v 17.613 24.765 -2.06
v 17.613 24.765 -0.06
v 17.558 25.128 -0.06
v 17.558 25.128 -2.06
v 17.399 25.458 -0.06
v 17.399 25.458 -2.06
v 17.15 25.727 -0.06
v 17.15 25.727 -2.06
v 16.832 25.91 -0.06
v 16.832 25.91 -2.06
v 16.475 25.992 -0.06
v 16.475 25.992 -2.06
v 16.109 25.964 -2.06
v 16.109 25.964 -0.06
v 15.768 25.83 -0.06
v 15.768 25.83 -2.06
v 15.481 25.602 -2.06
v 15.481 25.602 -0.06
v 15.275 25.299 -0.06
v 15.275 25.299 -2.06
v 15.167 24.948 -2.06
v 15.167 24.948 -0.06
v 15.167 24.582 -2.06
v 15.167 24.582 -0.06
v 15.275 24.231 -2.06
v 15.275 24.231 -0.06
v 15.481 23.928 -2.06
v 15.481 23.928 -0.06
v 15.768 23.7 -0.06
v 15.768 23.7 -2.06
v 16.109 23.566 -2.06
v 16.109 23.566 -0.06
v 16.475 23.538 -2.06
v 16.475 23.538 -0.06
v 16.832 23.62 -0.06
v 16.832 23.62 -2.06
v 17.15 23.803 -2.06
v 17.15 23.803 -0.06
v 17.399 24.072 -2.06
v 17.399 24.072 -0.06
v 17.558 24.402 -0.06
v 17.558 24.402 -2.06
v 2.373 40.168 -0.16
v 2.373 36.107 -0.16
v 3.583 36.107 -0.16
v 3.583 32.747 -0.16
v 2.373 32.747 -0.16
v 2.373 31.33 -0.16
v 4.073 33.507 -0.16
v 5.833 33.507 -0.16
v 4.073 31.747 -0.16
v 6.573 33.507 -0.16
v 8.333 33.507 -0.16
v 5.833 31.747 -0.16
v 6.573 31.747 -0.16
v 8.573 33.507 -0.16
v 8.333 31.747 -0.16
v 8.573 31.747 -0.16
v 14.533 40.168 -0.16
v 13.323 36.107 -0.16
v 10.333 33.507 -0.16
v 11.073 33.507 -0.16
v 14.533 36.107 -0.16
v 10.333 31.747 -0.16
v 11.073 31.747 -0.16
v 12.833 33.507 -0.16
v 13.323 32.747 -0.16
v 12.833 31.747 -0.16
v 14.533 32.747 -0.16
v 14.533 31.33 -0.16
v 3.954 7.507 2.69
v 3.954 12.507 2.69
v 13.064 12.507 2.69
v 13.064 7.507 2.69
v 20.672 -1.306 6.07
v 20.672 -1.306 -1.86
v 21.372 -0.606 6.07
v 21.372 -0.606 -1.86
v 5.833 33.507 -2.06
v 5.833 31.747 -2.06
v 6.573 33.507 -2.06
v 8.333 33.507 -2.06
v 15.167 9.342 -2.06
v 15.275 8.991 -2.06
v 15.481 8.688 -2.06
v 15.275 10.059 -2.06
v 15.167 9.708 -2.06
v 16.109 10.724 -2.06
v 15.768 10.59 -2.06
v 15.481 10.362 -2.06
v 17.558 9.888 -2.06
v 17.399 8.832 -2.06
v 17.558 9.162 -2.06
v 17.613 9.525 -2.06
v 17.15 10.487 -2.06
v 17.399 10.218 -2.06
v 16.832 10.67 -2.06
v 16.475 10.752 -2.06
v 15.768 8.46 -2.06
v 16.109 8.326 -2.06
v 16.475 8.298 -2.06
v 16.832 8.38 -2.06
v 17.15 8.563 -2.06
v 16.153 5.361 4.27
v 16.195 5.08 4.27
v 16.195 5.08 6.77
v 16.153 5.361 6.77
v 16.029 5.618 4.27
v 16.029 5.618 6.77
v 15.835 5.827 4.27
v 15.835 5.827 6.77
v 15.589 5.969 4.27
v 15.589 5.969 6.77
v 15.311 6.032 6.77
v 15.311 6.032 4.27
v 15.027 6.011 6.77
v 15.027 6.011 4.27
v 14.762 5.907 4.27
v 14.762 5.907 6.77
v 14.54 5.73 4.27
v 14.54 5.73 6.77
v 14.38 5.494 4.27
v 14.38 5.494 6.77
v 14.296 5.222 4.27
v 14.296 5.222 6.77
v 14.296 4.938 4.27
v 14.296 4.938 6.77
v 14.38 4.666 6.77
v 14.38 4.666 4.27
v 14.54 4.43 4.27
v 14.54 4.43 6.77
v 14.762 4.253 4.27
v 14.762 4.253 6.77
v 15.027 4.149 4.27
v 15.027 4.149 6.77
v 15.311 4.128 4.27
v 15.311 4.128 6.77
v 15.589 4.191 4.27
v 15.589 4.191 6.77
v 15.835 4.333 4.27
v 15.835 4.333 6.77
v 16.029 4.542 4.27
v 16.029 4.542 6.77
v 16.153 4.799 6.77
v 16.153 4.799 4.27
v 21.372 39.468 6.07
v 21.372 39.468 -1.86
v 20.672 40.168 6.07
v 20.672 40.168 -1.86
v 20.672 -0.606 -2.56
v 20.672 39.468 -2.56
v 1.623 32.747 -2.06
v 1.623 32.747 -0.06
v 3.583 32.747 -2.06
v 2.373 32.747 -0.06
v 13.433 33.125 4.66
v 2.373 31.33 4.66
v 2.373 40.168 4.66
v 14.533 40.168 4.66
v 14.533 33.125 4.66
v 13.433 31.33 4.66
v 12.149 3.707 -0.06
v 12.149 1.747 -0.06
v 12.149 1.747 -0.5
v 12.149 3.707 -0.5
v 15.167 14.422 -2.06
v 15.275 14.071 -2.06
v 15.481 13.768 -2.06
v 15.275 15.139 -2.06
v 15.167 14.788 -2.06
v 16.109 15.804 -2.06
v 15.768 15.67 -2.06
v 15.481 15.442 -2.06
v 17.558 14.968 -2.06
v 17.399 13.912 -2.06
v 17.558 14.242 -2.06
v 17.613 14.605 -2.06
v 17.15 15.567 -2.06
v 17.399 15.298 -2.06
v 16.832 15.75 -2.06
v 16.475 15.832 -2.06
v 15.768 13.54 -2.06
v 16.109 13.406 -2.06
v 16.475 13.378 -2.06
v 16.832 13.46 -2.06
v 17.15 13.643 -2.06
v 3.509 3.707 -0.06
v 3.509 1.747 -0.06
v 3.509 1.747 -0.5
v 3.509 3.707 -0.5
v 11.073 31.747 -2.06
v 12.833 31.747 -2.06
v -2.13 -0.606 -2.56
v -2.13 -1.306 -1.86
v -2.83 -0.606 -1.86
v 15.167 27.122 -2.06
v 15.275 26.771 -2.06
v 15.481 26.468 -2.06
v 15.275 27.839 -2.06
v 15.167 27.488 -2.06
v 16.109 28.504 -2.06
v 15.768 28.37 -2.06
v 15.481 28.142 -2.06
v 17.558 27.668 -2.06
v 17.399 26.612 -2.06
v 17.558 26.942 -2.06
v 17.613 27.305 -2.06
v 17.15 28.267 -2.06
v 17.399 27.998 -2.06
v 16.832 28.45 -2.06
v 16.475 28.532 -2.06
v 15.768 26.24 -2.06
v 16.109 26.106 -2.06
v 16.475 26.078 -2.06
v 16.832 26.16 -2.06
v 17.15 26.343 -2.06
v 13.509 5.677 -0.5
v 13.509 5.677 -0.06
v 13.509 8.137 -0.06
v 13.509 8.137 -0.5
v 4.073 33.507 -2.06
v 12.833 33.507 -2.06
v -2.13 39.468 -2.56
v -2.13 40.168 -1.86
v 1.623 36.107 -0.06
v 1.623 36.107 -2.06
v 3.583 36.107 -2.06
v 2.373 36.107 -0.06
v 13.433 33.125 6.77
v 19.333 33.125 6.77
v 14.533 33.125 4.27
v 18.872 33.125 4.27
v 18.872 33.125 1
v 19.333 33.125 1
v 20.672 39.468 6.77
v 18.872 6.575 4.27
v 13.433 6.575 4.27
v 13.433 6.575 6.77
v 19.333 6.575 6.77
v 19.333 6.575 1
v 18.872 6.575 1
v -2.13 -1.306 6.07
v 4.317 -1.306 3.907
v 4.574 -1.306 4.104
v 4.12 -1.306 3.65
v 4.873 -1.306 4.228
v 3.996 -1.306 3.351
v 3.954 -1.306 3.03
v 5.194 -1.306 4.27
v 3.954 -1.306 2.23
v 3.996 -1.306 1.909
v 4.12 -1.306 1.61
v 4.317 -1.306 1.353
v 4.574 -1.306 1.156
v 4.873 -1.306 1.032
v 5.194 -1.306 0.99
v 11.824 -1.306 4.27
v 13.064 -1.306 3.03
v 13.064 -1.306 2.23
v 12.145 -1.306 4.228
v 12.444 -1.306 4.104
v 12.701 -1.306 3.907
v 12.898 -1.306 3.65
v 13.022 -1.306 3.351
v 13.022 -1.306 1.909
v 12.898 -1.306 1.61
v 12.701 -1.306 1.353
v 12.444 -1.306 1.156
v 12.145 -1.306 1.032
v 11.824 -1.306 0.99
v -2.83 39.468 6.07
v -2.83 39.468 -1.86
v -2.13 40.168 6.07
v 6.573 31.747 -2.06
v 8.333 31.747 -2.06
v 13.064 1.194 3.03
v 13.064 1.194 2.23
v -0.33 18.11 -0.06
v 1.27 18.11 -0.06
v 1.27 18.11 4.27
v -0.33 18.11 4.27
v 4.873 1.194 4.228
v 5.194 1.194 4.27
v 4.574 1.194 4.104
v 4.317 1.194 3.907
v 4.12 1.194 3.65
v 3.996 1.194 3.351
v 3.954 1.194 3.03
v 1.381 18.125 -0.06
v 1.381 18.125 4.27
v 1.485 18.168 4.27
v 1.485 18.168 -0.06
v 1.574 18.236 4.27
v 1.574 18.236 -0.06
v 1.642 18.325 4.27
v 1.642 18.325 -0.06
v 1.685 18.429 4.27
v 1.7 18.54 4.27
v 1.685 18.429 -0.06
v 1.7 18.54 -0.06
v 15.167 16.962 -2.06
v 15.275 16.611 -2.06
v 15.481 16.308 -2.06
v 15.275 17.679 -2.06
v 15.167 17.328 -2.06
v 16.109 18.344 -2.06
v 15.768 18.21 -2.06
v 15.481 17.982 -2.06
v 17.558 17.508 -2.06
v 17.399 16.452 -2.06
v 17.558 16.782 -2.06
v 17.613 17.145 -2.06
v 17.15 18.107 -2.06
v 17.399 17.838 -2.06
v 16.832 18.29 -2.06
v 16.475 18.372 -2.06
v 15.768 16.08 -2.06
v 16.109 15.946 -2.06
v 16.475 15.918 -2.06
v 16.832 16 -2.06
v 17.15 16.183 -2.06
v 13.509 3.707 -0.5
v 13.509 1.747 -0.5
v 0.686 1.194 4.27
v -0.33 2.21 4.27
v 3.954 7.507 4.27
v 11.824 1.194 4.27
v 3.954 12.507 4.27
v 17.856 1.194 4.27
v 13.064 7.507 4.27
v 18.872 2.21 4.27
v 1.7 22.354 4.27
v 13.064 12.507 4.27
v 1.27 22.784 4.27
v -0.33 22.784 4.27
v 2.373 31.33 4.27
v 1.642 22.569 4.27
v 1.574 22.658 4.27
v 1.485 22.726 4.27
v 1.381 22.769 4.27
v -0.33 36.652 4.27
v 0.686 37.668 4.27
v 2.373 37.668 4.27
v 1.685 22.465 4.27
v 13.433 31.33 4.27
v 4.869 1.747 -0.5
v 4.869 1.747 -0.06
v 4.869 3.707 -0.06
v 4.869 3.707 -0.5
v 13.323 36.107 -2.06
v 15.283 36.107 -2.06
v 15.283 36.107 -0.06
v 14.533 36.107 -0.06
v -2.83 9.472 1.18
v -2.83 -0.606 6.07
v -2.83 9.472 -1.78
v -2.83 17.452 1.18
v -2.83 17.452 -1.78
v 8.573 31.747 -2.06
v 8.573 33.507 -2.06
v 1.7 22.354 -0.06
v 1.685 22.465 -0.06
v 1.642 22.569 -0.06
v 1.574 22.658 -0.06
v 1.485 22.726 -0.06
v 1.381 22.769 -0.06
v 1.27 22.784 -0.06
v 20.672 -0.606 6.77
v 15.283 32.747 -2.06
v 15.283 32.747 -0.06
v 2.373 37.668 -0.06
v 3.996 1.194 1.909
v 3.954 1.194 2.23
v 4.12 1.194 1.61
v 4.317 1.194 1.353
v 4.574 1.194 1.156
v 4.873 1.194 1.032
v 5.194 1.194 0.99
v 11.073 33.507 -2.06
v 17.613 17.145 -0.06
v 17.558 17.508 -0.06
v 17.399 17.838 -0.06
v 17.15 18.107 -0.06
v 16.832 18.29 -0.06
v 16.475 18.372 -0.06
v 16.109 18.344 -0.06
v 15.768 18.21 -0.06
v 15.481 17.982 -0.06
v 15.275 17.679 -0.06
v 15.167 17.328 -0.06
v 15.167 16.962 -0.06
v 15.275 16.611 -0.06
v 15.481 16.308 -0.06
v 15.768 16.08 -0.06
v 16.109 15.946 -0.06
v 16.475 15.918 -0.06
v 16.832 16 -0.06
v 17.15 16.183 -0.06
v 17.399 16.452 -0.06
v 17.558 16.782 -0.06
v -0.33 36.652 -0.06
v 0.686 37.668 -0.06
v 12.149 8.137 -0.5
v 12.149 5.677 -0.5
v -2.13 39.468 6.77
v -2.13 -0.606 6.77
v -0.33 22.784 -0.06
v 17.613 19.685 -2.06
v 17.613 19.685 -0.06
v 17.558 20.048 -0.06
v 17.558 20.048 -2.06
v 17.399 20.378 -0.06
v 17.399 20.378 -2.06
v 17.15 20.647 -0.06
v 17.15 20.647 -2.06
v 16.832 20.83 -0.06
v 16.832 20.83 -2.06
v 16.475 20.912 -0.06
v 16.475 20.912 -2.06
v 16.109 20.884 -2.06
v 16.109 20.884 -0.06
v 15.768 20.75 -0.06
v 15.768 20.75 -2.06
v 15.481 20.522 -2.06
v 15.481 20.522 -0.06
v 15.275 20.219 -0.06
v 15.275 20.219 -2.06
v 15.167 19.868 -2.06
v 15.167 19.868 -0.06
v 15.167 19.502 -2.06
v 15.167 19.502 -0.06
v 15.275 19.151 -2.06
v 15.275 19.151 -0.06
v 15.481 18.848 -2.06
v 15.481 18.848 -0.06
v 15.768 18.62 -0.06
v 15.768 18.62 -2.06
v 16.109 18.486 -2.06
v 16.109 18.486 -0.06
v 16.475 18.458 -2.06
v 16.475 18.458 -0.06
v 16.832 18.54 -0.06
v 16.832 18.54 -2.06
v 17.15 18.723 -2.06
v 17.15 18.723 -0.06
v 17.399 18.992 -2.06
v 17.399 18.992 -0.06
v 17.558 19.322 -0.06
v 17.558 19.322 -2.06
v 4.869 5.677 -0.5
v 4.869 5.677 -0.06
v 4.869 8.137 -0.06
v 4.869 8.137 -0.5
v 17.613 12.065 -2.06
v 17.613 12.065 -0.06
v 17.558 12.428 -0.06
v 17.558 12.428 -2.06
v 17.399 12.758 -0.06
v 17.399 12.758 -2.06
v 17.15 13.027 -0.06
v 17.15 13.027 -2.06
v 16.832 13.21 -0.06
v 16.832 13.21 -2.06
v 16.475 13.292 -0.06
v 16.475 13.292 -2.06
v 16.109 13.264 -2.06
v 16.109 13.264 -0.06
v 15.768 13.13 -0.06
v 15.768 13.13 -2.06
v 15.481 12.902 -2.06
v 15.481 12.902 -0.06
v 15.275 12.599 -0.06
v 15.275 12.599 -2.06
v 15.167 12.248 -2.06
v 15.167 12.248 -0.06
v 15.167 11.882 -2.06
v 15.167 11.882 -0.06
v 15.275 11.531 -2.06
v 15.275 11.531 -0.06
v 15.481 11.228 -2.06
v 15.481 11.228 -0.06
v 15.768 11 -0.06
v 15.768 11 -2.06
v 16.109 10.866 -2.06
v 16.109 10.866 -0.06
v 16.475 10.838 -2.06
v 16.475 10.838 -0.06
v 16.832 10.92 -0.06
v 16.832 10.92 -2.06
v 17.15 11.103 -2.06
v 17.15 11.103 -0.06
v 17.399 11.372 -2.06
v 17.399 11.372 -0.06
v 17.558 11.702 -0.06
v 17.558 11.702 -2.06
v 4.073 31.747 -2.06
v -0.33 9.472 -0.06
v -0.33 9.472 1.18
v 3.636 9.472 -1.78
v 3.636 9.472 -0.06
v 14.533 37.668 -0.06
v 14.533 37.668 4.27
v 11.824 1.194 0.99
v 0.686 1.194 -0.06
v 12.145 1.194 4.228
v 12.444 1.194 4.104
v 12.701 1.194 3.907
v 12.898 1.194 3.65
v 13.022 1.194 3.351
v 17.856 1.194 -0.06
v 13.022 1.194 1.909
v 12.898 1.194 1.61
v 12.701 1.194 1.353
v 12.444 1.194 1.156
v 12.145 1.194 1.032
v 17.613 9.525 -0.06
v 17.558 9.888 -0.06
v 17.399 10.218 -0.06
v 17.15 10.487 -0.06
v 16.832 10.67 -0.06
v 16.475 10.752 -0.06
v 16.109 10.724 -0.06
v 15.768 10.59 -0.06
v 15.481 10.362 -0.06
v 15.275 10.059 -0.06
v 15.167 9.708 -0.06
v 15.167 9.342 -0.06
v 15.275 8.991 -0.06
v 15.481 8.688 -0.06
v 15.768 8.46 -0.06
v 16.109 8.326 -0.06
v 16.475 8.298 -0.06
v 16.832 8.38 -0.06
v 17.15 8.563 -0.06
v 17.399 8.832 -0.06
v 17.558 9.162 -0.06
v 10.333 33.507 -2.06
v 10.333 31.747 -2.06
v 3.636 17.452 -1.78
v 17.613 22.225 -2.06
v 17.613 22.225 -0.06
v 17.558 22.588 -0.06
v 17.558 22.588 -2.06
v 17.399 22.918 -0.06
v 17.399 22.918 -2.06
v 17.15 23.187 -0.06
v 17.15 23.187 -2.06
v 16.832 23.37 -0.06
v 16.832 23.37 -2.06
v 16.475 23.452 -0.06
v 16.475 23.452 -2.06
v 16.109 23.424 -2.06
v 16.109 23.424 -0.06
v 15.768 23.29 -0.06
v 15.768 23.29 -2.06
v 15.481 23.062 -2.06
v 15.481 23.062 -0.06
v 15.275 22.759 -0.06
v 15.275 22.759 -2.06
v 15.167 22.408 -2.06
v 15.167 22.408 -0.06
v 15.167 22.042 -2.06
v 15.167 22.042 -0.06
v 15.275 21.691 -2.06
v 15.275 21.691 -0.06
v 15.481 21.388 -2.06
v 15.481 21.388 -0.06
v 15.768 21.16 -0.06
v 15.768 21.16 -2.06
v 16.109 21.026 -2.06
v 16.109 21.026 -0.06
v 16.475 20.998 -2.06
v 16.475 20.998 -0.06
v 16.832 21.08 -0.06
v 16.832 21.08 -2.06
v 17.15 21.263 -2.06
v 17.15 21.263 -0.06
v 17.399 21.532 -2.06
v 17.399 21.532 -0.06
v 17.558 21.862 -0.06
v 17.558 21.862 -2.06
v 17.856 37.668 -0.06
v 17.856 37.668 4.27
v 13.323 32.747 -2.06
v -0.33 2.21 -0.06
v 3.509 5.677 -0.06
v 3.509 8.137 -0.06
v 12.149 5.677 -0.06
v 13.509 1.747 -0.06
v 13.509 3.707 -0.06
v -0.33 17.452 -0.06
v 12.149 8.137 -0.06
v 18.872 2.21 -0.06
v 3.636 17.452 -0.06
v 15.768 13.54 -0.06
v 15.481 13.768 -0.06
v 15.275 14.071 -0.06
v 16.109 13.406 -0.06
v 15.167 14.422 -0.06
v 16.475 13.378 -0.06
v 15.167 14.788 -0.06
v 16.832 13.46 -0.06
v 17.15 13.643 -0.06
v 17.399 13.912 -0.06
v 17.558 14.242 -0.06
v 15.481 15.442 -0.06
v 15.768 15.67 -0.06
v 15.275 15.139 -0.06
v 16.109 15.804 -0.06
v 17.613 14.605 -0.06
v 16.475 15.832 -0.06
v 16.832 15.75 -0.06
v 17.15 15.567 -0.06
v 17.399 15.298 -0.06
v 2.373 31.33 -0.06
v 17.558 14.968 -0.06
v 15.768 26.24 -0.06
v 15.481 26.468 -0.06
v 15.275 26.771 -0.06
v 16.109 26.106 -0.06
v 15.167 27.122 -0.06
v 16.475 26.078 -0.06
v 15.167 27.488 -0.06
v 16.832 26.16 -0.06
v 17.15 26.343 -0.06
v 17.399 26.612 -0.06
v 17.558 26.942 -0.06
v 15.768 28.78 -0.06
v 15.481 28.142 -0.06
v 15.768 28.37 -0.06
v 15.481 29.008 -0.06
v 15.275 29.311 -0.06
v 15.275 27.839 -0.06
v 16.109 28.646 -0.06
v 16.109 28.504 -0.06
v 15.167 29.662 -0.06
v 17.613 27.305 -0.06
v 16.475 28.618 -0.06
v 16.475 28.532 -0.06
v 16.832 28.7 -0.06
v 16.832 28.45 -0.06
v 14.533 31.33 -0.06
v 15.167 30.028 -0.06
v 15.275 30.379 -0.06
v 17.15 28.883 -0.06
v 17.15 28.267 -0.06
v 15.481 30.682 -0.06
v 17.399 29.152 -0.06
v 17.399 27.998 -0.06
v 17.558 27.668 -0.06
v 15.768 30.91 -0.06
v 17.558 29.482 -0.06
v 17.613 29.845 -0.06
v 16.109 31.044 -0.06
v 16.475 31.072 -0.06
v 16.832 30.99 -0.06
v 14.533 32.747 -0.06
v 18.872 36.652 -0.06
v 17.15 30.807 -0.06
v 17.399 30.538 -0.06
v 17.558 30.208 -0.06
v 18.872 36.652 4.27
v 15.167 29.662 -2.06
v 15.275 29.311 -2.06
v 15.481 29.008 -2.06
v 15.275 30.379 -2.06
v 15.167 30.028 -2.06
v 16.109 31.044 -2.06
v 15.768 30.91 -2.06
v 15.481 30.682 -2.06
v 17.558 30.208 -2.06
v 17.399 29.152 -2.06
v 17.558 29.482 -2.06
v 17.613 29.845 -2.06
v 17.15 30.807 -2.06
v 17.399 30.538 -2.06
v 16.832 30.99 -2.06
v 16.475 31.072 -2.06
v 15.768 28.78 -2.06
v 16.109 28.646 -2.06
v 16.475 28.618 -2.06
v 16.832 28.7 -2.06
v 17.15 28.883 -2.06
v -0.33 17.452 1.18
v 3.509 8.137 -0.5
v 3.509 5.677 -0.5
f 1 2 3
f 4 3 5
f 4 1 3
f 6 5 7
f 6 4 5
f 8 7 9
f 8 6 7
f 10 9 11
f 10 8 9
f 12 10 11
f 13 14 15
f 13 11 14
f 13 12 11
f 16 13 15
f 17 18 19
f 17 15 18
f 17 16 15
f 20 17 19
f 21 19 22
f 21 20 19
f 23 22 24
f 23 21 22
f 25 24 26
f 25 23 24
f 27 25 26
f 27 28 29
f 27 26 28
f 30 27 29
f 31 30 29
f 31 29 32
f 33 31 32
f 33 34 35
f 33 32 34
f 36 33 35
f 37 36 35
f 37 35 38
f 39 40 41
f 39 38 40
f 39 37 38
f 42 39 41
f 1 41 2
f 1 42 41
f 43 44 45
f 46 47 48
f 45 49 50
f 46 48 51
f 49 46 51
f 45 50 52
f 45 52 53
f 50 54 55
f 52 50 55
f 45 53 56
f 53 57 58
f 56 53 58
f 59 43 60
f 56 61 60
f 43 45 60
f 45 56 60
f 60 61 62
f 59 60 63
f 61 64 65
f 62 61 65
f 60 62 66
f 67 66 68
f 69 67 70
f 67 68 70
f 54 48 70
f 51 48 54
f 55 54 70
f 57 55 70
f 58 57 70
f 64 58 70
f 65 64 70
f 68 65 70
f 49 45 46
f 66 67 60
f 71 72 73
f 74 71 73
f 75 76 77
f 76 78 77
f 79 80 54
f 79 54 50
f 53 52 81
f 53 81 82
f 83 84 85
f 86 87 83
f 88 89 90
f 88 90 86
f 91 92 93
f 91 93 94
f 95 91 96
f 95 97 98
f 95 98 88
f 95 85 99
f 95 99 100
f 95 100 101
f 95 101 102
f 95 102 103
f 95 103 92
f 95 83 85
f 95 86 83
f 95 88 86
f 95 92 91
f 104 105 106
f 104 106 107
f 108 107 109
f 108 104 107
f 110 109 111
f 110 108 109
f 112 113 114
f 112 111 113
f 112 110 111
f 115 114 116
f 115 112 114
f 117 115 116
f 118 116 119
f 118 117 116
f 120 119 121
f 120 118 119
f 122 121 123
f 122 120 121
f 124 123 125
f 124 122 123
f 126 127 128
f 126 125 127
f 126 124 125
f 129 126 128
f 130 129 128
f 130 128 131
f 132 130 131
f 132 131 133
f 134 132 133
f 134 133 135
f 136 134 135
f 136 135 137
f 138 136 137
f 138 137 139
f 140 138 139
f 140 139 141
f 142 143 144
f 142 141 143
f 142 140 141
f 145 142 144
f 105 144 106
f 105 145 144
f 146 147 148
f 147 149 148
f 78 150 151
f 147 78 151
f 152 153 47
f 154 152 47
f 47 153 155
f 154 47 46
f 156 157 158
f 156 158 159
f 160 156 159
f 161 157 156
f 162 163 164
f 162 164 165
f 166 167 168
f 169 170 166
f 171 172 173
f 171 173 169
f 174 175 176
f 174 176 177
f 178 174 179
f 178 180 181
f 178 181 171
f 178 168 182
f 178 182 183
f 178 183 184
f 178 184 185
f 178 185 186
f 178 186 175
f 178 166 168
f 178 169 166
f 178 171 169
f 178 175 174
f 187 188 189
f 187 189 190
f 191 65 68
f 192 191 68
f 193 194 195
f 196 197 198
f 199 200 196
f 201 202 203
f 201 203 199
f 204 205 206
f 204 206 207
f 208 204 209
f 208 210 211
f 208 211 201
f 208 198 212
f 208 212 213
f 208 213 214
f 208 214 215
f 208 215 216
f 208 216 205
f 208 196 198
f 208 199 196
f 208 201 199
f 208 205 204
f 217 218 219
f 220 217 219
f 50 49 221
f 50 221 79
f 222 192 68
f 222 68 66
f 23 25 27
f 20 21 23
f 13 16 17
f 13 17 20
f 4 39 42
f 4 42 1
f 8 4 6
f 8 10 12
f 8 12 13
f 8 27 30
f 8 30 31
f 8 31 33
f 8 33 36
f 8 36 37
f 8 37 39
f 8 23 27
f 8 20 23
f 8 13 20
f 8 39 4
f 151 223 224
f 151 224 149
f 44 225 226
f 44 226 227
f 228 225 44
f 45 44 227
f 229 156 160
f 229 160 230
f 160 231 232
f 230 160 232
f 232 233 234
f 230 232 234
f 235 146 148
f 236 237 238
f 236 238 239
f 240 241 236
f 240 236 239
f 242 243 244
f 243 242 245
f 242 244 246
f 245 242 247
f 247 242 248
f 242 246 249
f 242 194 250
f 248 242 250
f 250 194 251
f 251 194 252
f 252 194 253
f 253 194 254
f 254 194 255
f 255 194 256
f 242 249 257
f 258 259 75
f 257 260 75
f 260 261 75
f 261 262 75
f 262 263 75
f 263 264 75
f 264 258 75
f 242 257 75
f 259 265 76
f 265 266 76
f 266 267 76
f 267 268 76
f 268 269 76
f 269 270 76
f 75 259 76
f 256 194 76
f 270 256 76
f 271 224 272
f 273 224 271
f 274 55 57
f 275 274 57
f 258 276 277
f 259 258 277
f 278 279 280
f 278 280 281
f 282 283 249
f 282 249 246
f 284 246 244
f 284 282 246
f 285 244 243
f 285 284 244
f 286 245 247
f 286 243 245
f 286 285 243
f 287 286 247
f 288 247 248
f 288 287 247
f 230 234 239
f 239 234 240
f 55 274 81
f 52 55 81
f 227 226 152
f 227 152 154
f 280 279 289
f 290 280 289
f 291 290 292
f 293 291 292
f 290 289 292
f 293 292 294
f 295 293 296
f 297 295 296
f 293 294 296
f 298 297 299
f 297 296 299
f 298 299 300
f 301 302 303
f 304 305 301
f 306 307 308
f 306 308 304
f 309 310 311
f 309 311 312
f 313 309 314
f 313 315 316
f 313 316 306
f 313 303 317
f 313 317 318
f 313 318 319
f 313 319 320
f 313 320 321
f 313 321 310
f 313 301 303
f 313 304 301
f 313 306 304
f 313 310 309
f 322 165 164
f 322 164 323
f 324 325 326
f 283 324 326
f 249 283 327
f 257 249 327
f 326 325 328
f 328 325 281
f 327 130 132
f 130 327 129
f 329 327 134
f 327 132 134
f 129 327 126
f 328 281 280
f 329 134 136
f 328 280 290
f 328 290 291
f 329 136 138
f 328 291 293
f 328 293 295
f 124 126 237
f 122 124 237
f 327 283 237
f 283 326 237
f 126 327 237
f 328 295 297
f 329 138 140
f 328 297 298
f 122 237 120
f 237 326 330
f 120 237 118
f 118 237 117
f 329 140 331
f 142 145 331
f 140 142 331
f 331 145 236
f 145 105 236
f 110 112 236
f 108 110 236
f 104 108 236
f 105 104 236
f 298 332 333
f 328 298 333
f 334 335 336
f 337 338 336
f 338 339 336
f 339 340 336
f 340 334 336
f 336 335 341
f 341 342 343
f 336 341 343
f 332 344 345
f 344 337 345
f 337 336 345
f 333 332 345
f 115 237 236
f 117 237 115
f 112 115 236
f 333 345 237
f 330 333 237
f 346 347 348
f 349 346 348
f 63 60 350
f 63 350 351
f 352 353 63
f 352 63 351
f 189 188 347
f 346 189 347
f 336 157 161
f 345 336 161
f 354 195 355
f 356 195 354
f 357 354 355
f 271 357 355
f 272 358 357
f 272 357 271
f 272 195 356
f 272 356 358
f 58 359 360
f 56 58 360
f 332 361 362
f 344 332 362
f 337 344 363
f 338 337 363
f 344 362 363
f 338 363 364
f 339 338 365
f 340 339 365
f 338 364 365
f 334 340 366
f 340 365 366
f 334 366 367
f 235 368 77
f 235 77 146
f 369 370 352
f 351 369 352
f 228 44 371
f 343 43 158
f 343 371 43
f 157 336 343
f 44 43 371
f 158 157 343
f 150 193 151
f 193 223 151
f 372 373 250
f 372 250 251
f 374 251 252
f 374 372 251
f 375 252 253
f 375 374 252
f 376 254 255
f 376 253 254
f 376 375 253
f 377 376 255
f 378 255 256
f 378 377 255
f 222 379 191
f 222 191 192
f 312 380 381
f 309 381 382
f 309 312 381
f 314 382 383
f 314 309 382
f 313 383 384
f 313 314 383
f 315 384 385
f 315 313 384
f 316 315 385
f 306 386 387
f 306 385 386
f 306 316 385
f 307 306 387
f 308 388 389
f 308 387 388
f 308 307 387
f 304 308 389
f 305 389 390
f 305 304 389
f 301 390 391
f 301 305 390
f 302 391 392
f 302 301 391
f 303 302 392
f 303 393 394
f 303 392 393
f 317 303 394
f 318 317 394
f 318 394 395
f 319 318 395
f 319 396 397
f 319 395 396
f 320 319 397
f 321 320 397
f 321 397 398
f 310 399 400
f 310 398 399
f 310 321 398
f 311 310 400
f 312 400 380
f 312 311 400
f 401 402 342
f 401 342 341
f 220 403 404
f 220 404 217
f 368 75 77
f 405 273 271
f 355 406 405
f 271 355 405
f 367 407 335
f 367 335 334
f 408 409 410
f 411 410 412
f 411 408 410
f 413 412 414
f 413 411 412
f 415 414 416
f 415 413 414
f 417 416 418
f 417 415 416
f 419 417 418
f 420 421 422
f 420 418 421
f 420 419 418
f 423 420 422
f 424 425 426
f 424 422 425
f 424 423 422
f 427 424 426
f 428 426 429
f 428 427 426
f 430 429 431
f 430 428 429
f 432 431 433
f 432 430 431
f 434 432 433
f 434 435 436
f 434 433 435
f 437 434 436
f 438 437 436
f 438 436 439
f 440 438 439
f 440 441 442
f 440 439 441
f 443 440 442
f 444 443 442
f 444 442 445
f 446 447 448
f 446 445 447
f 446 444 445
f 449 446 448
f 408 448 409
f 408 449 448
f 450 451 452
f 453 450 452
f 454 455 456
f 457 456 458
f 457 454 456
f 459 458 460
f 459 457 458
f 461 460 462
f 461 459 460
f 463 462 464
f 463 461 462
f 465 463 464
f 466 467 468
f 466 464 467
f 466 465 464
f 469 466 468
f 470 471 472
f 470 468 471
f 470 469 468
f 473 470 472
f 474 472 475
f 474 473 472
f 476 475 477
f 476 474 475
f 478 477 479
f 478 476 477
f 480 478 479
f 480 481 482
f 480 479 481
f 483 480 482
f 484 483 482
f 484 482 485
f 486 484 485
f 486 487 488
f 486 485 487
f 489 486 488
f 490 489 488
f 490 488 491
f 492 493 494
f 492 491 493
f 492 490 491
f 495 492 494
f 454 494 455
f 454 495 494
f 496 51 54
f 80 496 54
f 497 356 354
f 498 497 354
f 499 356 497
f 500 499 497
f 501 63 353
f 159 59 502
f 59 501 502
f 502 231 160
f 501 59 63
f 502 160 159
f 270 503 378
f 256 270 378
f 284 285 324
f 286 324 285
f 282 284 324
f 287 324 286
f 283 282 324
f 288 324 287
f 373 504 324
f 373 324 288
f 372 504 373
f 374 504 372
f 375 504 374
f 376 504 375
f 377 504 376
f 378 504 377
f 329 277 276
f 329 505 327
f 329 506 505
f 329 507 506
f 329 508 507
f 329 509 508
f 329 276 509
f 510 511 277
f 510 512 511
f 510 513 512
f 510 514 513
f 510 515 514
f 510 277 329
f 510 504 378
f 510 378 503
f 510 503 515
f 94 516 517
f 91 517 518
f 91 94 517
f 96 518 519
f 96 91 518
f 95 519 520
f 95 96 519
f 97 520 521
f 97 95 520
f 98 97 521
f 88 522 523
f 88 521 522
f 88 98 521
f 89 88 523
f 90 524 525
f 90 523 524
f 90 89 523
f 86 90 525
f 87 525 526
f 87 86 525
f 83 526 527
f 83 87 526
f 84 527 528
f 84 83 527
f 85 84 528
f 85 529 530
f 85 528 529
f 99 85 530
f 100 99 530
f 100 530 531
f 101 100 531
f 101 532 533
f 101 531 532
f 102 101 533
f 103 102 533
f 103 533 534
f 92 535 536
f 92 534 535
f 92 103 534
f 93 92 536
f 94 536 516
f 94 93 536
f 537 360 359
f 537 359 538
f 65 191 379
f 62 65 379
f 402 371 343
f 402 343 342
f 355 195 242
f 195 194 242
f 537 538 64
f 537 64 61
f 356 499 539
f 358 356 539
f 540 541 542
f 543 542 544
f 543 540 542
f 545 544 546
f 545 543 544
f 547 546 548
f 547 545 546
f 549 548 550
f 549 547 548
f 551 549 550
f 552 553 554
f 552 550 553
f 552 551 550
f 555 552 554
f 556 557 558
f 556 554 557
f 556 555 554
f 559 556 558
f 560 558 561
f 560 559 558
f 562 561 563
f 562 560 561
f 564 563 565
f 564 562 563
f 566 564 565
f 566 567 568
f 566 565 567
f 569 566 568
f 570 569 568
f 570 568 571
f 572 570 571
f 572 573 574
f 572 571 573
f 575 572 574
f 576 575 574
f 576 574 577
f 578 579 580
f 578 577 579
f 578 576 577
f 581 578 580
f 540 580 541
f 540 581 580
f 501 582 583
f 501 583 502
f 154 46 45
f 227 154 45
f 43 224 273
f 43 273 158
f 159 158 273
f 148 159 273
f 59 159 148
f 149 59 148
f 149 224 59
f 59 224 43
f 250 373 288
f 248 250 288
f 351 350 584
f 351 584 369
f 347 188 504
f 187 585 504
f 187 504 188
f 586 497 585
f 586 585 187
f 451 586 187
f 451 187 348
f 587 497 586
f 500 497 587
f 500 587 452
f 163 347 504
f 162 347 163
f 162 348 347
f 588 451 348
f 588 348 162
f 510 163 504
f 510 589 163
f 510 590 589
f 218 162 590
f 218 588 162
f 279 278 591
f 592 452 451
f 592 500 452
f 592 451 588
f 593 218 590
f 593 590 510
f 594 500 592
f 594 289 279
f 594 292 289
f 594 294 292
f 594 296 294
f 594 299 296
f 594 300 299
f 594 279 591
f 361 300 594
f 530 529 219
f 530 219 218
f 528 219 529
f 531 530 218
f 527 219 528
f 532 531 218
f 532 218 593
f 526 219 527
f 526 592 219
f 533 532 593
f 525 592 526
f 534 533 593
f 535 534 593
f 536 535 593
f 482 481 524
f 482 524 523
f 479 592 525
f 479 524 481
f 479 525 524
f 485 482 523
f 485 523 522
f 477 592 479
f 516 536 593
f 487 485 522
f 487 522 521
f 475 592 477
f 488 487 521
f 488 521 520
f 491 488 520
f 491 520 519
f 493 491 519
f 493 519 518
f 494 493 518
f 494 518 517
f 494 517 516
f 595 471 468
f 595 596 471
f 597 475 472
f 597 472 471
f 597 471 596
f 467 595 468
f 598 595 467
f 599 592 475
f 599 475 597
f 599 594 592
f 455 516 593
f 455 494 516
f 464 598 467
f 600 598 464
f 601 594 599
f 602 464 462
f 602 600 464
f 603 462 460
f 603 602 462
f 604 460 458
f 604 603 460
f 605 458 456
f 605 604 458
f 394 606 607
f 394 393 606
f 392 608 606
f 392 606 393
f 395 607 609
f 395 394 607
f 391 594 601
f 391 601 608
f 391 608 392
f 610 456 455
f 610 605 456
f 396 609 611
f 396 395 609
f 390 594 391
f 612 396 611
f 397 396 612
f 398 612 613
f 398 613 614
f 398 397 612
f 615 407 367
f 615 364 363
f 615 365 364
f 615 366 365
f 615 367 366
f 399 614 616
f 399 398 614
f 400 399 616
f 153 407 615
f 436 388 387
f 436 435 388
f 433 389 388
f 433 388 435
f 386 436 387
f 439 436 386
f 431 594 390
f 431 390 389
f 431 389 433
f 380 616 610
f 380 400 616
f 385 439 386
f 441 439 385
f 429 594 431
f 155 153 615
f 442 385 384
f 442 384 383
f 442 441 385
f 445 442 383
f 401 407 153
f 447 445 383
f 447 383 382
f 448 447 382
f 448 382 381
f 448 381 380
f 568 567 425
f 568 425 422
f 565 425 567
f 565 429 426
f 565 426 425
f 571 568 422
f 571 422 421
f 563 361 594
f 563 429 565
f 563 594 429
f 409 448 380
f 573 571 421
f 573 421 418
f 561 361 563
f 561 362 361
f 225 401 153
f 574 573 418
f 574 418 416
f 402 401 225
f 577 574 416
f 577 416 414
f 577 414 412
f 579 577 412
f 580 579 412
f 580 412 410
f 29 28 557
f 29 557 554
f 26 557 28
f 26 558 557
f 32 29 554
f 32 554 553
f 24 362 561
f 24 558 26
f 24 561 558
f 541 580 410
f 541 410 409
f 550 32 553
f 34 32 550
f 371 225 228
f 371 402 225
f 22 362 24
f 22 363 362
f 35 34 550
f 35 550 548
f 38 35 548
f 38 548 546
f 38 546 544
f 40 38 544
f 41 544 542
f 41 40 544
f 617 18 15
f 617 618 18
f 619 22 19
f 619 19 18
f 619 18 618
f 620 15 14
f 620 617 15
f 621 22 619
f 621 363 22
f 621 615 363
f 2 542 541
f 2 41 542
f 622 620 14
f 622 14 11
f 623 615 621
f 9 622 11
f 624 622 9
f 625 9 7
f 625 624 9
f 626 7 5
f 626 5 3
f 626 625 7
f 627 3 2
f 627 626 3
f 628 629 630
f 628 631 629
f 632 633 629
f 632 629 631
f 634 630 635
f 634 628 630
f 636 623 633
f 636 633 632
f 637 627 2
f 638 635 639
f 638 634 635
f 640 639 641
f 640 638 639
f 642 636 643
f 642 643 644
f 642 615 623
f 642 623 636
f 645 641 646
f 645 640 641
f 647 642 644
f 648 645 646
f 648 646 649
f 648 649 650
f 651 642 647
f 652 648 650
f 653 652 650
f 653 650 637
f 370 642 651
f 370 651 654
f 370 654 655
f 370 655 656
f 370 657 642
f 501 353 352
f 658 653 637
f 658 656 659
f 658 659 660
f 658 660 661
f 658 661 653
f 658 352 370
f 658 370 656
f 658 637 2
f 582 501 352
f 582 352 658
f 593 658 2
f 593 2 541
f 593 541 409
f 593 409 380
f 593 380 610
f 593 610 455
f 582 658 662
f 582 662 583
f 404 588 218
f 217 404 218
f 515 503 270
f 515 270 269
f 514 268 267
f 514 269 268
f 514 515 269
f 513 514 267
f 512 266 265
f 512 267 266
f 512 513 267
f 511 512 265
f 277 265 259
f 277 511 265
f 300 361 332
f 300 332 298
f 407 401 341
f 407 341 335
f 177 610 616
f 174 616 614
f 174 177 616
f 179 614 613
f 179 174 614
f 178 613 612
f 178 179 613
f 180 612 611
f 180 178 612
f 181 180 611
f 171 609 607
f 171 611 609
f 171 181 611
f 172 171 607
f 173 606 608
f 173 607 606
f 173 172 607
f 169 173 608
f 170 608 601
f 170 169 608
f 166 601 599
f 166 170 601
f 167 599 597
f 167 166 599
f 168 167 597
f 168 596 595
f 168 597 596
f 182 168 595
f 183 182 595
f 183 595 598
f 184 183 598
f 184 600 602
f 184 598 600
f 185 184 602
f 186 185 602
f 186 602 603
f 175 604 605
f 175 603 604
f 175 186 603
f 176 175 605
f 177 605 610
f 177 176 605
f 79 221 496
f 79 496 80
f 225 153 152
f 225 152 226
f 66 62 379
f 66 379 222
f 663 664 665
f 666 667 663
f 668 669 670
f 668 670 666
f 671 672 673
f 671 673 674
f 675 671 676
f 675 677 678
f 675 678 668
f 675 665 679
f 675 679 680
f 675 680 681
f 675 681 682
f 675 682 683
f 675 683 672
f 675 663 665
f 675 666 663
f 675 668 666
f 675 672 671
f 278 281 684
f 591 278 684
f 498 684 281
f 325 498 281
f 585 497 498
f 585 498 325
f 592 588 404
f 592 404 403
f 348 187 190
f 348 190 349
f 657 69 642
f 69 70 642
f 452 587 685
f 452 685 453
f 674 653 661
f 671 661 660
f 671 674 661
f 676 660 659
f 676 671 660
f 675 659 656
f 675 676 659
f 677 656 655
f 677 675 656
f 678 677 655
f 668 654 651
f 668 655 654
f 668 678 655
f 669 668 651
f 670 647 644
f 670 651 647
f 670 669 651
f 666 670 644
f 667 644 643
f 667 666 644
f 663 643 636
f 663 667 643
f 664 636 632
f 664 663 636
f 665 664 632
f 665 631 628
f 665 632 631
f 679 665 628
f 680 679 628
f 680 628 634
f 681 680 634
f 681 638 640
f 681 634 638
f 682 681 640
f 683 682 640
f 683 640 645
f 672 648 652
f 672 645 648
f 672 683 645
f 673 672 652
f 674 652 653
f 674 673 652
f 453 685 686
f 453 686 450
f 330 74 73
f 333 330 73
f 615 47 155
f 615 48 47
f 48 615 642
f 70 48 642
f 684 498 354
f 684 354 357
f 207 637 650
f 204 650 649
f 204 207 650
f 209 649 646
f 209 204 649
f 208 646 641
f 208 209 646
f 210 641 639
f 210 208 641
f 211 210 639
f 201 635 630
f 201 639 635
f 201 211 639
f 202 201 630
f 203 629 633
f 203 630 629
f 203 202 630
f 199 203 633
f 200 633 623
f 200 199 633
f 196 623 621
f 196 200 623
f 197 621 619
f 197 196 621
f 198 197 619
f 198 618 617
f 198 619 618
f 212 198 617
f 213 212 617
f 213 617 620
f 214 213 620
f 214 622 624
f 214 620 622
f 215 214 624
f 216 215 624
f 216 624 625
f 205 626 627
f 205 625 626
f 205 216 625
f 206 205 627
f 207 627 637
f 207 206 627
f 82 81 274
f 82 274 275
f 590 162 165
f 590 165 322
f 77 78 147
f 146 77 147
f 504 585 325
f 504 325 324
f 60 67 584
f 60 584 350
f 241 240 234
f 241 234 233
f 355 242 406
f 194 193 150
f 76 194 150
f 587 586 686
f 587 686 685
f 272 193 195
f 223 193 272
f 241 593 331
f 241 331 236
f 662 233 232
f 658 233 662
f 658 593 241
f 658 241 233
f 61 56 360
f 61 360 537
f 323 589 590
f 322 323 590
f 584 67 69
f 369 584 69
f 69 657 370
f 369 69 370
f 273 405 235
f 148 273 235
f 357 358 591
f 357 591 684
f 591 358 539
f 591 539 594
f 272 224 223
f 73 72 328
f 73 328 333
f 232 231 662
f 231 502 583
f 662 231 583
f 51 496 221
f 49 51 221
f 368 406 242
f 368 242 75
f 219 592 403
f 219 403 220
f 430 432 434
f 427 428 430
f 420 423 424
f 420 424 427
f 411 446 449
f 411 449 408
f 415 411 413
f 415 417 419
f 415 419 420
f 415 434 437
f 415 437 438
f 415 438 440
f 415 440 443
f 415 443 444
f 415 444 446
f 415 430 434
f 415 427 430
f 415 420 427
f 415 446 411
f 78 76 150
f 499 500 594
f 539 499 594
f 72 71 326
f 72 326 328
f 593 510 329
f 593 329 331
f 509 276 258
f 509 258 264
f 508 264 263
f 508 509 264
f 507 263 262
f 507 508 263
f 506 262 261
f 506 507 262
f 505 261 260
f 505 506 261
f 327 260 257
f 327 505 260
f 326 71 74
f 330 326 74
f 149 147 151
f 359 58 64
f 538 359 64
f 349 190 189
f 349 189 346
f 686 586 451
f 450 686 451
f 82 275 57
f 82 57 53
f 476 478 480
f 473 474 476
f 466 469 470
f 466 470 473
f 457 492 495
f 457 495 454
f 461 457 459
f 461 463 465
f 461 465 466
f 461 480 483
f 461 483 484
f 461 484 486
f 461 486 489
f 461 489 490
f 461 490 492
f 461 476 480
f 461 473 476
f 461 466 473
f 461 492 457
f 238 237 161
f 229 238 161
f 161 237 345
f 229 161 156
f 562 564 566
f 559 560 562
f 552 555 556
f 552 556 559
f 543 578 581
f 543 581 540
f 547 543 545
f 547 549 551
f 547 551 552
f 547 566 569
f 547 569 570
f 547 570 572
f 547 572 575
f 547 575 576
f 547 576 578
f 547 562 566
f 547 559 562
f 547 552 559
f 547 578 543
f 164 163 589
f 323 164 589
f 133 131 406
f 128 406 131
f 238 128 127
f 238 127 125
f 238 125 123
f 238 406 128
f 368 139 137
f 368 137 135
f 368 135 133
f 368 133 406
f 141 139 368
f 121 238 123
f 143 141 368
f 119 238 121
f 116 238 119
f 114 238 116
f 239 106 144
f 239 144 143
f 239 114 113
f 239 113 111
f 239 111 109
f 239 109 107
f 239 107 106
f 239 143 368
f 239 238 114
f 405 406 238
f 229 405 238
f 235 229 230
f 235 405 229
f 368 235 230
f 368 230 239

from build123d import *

# Parameters (mm, degrees)
SKETCH_W            = 24.202
SKETCH_H            = 41.474
PAD_DEPTH           = 9.33
CHAMFER_SIZE        = 0.7
POCKET_DEPTH        = 4.33
SKETCH002_R         = 0.955
POCKET001_DEPTH     = 6.771
POCKET002_DEPTH     = 8.734
SKETCH007_W         = 1.36
SKETCH007_H         = 2.46
SKETCH007_H_2       = 1.96
POCKET005_DEPTH     = 0.5
SKETCH004_W         = 9.11
SKETCH004_H         = 5
PAD001_DEPTH        = 4.08
SKETCH005_W         = 12.16
SKETCH005_H         = 3.66
POCKET003_DEPTH     = 8.839
SKETCH006_W         = 12.16
SKETCH006_H         = 4.82
POCKET004_DEPTH     = 8.839
SKETCH008_W         = 1.96
SKETCH008_H         = 3.36
SKETCH008_W_2       = 1.76
SKETCH008_H_2       = 1.76
POCKET006_DEPTH     = 2.06
POCKET007_DEPTH     = 5.771
SKETCH010_R         = 1.23
POCKET008_DEPTH     = 8.831
LINEARPATTERN_COUNT = 9
LINEARPATTERN_PITCH = 2.54
SKETCH011_W         = 7.98
SKETCH011_H         = 2.96
POCKET009_DEPTH     = 6.467


with BuildPart() as part:
    # Sketch → Pad (new body)
    with BuildSketch(Plane.XY.offset(-2.56)):
        with Locations((9.271, 19.431)):
            Rectangle(SKETCH_W, SKETCH_H)
    extrude(amount=PAD_DEPTH)

    # Chamfer
    chamfer_edges = [part.edges().sort_by_distance(p)[0] for p in [
        (-2.83, -1.306, 2.105),
        (21.372, -1.306, 2.105),
        (9.271, -1.306, -2.56),
        (9.271, -1.306, 6.77),
        (21.372, 40.168, 2.105),
        (21.372, 19.431, -2.56),
        (21.372, 19.431, 6.77),
        (-2.83, 40.168, 2.105),
        (9.271, 40.168, -2.56),
        (9.271, 40.168, 6.77),
        (-2.83, 19.431, -2.56),
        (-2.83, 19.431, 6.77),
    ]]
    chamfer(chamfer_edges, length=CHAMFER_SIZE)

    # Sketch001 → Pocket (cut)
    with BuildSketch(Plane.XY.offset(-0.06)):
        with BuildLine():
            Line((-0.33, 2.21), (0.686, 1.194))
            Line((0.686, 1.194), (17.856, 1.194))
            Line((17.856, 1.194), (18.872, 2.21))
            Line((18.872, 2.21), (18.872, 36.652))
            Line((18.872, 36.652), (17.856, 37.668))
            Line((17.856, 37.668), (0.686, 37.668))
            Line((0.686, 37.668), (-0.33, 36.652))
            Line((-0.33, 36.652), (-0.33, 22.784))
            Line((-0.33, 22.784), (1.27, 22.784))
            ThreePointArc((1.7, 22.354), (1.574056, 22.658056), (1.27, 22.784))
            Line((1.7, 22.354), (1.7, 18.54))
            ThreePointArc((1.27, 18.11), (1.574056, 18.235944), (1.7, 18.54))
            Line((1.27, 18.11), (-0.33, 18.11))
            Line((-0.33, 18.11), (-0.33, 2.21))
        make_face()
    extrude(amount=POCKET_DEPTH, mode=Mode.SUBTRACT)

    # Sketch002 → Pocket001 (cut, through all)
    with BuildSketch(Plane.XY):
        with Locations((15.24, 5.08)):
            Circle(SKETCH002_R)
    extrude(amount=POCKET001_DEPTH, mode=Mode.SUBTRACT)

    # Sketch003 → Pocket002 (cut, through all)
    with BuildSketch(Plane.XZ.offset(-7.427)):
        with BuildLine():
            Line((5.194, 4.27), (11.824, 4.27))
            ThreePointArc((13.064, 3.03), (12.700812, 3.906812), (11.824, 4.27))
            Line((13.064, 3.03), (13.064, 2.23))
            ThreePointArc((11.824, 0.99), (12.700812, 1.353188), (13.064, 2.23))
            Line((11.824, 0.99), (5.194, 0.99))
            ThreePointArc((3.954, 2.23), (4.317188, 1.353188), (5.194, 0.99))
            Line((3.954, 2.23), (3.954, 3.03))
            ThreePointArc((5.194, 4.27), (4.317188, 3.906812), (3.954, 3.03))
        make_face()
    extrude(amount=POCKET002_DEPTH, mode=Mode.SUBTRACT)

    # Sketch007 → Pocket005 (cut)
    with BuildSketch(Plane.XY):
        with Locations((4.189, 6.907)):
            Rectangle(SKETCH007_W, SKETCH007_H)
        with Locations((4.189, 2.727)):
            Rectangle(SKETCH007_W, SKETCH007_H_2)
        with Locations((12.829, 2.727)):
            Rectangle(SKETCH007_W, SKETCH007_H_2)
        with Locations((12.829, 6.907)):
            Rectangle(SKETCH007_W, SKETCH007_H)
    extrude(amount=-POCKET005_DEPTH, mode=Mode.SUBTRACT)

    # Sketch004 → Pad001 (join)
    with BuildSketch(Plane.XY.offset(2.69)):
        with Locations((8.509, 10.007)):
            Rectangle(SKETCH004_W, SKETCH004_H)
    extrude(amount=PAD001_DEPTH)

    # Sketch005 → Pocket003 (cut, through all)
    with BuildSketch(Plane.XZ.offset(-31.33)):
        with Locations((8.453, 2.83)):
            Rectangle(SKETCH005_W, SKETCH005_H)
    extrude(amount=-POCKET003_DEPTH, mode=Mode.SUBTRACT)

    # Sketch006 → Pocket004 (cut, through all)
    with BuildSketch(Plane.XZ.offset(-31.33)):
        with Locations((8.453, 2.25)):
            Rectangle(SKETCH006_W, SKETCH006_H)
    extrude(amount=-POCKET004_DEPTH, mode=Mode.SUBTRACT)

    # Sketch008 → Pocket006 (cut)
    with BuildSketch(Plane.XY):
        with Locations((2.603, 34.427)):
            Rectangle(SKETCH008_W, SKETCH008_H)
        with Locations((14.303, 34.427)):
            Rectangle(SKETCH008_W, SKETCH008_H)
        with Locations((4.953, 32.627)):
            Rectangle(SKETCH008_W_2, SKETCH008_H_2)
        with Locations((7.453, 32.627)):
            Rectangle(SKETCH008_W_2, SKETCH008_H_2)
        with Locations((9.453, 32.627)):
            Rectangle(SKETCH008_W_2, SKETCH008_H_2)
        with Locations((11.953, 32.627)):
            Rectangle(SKETCH008_W_2, SKETCH008_H_2)
    extrude(amount=-POCKET006_DEPTH, mode=Mode.SUBTRACT)

    # Sketch009 → Pocket007 (cut, through all)
    with BuildSketch(Plane.XY.offset(1)):
        Polygon((13.433, 33.125), (19.333, 33.125), (19.333, 6.575), (16.383, 6.575), (13.433, 6.575), align=None)
    extrude(amount=POCKET007_DEPTH, mode=Mode.SUBTRACT)

    # Sketch010 → Pocket008 (cut, through all)
    with BuildSketch(Plane.XY.offset(-2.06)):
        with Locations((16.383, 9.525)):
            Circle(SKETCH010_R)
    pocket008 = extrude(amount=POCKET008_DEPTH, mode=Mode.SUBTRACT)

    # LinearPattern: Pocket008 ×9
    with Locations(*[(0, i * LINEARPATTERN_PITCH, 0) for i in range(1, LINEARPATTERN_COUNT)]):
        add(pocket008, mode=Mode.SUBTRACT)

    # Sketch011 → Pocket009 (cut, through all)
    with BuildSketch(Plane.YZ.offset(3.636)):
        with Locations((13.462, -0.3)):
            Rectangle(SKETCH011_W, SKETCH011_H)
    extrude(amount=-POCKET009_DEPTH, mode=Mode.SUBTRACT)


solid = part.part
